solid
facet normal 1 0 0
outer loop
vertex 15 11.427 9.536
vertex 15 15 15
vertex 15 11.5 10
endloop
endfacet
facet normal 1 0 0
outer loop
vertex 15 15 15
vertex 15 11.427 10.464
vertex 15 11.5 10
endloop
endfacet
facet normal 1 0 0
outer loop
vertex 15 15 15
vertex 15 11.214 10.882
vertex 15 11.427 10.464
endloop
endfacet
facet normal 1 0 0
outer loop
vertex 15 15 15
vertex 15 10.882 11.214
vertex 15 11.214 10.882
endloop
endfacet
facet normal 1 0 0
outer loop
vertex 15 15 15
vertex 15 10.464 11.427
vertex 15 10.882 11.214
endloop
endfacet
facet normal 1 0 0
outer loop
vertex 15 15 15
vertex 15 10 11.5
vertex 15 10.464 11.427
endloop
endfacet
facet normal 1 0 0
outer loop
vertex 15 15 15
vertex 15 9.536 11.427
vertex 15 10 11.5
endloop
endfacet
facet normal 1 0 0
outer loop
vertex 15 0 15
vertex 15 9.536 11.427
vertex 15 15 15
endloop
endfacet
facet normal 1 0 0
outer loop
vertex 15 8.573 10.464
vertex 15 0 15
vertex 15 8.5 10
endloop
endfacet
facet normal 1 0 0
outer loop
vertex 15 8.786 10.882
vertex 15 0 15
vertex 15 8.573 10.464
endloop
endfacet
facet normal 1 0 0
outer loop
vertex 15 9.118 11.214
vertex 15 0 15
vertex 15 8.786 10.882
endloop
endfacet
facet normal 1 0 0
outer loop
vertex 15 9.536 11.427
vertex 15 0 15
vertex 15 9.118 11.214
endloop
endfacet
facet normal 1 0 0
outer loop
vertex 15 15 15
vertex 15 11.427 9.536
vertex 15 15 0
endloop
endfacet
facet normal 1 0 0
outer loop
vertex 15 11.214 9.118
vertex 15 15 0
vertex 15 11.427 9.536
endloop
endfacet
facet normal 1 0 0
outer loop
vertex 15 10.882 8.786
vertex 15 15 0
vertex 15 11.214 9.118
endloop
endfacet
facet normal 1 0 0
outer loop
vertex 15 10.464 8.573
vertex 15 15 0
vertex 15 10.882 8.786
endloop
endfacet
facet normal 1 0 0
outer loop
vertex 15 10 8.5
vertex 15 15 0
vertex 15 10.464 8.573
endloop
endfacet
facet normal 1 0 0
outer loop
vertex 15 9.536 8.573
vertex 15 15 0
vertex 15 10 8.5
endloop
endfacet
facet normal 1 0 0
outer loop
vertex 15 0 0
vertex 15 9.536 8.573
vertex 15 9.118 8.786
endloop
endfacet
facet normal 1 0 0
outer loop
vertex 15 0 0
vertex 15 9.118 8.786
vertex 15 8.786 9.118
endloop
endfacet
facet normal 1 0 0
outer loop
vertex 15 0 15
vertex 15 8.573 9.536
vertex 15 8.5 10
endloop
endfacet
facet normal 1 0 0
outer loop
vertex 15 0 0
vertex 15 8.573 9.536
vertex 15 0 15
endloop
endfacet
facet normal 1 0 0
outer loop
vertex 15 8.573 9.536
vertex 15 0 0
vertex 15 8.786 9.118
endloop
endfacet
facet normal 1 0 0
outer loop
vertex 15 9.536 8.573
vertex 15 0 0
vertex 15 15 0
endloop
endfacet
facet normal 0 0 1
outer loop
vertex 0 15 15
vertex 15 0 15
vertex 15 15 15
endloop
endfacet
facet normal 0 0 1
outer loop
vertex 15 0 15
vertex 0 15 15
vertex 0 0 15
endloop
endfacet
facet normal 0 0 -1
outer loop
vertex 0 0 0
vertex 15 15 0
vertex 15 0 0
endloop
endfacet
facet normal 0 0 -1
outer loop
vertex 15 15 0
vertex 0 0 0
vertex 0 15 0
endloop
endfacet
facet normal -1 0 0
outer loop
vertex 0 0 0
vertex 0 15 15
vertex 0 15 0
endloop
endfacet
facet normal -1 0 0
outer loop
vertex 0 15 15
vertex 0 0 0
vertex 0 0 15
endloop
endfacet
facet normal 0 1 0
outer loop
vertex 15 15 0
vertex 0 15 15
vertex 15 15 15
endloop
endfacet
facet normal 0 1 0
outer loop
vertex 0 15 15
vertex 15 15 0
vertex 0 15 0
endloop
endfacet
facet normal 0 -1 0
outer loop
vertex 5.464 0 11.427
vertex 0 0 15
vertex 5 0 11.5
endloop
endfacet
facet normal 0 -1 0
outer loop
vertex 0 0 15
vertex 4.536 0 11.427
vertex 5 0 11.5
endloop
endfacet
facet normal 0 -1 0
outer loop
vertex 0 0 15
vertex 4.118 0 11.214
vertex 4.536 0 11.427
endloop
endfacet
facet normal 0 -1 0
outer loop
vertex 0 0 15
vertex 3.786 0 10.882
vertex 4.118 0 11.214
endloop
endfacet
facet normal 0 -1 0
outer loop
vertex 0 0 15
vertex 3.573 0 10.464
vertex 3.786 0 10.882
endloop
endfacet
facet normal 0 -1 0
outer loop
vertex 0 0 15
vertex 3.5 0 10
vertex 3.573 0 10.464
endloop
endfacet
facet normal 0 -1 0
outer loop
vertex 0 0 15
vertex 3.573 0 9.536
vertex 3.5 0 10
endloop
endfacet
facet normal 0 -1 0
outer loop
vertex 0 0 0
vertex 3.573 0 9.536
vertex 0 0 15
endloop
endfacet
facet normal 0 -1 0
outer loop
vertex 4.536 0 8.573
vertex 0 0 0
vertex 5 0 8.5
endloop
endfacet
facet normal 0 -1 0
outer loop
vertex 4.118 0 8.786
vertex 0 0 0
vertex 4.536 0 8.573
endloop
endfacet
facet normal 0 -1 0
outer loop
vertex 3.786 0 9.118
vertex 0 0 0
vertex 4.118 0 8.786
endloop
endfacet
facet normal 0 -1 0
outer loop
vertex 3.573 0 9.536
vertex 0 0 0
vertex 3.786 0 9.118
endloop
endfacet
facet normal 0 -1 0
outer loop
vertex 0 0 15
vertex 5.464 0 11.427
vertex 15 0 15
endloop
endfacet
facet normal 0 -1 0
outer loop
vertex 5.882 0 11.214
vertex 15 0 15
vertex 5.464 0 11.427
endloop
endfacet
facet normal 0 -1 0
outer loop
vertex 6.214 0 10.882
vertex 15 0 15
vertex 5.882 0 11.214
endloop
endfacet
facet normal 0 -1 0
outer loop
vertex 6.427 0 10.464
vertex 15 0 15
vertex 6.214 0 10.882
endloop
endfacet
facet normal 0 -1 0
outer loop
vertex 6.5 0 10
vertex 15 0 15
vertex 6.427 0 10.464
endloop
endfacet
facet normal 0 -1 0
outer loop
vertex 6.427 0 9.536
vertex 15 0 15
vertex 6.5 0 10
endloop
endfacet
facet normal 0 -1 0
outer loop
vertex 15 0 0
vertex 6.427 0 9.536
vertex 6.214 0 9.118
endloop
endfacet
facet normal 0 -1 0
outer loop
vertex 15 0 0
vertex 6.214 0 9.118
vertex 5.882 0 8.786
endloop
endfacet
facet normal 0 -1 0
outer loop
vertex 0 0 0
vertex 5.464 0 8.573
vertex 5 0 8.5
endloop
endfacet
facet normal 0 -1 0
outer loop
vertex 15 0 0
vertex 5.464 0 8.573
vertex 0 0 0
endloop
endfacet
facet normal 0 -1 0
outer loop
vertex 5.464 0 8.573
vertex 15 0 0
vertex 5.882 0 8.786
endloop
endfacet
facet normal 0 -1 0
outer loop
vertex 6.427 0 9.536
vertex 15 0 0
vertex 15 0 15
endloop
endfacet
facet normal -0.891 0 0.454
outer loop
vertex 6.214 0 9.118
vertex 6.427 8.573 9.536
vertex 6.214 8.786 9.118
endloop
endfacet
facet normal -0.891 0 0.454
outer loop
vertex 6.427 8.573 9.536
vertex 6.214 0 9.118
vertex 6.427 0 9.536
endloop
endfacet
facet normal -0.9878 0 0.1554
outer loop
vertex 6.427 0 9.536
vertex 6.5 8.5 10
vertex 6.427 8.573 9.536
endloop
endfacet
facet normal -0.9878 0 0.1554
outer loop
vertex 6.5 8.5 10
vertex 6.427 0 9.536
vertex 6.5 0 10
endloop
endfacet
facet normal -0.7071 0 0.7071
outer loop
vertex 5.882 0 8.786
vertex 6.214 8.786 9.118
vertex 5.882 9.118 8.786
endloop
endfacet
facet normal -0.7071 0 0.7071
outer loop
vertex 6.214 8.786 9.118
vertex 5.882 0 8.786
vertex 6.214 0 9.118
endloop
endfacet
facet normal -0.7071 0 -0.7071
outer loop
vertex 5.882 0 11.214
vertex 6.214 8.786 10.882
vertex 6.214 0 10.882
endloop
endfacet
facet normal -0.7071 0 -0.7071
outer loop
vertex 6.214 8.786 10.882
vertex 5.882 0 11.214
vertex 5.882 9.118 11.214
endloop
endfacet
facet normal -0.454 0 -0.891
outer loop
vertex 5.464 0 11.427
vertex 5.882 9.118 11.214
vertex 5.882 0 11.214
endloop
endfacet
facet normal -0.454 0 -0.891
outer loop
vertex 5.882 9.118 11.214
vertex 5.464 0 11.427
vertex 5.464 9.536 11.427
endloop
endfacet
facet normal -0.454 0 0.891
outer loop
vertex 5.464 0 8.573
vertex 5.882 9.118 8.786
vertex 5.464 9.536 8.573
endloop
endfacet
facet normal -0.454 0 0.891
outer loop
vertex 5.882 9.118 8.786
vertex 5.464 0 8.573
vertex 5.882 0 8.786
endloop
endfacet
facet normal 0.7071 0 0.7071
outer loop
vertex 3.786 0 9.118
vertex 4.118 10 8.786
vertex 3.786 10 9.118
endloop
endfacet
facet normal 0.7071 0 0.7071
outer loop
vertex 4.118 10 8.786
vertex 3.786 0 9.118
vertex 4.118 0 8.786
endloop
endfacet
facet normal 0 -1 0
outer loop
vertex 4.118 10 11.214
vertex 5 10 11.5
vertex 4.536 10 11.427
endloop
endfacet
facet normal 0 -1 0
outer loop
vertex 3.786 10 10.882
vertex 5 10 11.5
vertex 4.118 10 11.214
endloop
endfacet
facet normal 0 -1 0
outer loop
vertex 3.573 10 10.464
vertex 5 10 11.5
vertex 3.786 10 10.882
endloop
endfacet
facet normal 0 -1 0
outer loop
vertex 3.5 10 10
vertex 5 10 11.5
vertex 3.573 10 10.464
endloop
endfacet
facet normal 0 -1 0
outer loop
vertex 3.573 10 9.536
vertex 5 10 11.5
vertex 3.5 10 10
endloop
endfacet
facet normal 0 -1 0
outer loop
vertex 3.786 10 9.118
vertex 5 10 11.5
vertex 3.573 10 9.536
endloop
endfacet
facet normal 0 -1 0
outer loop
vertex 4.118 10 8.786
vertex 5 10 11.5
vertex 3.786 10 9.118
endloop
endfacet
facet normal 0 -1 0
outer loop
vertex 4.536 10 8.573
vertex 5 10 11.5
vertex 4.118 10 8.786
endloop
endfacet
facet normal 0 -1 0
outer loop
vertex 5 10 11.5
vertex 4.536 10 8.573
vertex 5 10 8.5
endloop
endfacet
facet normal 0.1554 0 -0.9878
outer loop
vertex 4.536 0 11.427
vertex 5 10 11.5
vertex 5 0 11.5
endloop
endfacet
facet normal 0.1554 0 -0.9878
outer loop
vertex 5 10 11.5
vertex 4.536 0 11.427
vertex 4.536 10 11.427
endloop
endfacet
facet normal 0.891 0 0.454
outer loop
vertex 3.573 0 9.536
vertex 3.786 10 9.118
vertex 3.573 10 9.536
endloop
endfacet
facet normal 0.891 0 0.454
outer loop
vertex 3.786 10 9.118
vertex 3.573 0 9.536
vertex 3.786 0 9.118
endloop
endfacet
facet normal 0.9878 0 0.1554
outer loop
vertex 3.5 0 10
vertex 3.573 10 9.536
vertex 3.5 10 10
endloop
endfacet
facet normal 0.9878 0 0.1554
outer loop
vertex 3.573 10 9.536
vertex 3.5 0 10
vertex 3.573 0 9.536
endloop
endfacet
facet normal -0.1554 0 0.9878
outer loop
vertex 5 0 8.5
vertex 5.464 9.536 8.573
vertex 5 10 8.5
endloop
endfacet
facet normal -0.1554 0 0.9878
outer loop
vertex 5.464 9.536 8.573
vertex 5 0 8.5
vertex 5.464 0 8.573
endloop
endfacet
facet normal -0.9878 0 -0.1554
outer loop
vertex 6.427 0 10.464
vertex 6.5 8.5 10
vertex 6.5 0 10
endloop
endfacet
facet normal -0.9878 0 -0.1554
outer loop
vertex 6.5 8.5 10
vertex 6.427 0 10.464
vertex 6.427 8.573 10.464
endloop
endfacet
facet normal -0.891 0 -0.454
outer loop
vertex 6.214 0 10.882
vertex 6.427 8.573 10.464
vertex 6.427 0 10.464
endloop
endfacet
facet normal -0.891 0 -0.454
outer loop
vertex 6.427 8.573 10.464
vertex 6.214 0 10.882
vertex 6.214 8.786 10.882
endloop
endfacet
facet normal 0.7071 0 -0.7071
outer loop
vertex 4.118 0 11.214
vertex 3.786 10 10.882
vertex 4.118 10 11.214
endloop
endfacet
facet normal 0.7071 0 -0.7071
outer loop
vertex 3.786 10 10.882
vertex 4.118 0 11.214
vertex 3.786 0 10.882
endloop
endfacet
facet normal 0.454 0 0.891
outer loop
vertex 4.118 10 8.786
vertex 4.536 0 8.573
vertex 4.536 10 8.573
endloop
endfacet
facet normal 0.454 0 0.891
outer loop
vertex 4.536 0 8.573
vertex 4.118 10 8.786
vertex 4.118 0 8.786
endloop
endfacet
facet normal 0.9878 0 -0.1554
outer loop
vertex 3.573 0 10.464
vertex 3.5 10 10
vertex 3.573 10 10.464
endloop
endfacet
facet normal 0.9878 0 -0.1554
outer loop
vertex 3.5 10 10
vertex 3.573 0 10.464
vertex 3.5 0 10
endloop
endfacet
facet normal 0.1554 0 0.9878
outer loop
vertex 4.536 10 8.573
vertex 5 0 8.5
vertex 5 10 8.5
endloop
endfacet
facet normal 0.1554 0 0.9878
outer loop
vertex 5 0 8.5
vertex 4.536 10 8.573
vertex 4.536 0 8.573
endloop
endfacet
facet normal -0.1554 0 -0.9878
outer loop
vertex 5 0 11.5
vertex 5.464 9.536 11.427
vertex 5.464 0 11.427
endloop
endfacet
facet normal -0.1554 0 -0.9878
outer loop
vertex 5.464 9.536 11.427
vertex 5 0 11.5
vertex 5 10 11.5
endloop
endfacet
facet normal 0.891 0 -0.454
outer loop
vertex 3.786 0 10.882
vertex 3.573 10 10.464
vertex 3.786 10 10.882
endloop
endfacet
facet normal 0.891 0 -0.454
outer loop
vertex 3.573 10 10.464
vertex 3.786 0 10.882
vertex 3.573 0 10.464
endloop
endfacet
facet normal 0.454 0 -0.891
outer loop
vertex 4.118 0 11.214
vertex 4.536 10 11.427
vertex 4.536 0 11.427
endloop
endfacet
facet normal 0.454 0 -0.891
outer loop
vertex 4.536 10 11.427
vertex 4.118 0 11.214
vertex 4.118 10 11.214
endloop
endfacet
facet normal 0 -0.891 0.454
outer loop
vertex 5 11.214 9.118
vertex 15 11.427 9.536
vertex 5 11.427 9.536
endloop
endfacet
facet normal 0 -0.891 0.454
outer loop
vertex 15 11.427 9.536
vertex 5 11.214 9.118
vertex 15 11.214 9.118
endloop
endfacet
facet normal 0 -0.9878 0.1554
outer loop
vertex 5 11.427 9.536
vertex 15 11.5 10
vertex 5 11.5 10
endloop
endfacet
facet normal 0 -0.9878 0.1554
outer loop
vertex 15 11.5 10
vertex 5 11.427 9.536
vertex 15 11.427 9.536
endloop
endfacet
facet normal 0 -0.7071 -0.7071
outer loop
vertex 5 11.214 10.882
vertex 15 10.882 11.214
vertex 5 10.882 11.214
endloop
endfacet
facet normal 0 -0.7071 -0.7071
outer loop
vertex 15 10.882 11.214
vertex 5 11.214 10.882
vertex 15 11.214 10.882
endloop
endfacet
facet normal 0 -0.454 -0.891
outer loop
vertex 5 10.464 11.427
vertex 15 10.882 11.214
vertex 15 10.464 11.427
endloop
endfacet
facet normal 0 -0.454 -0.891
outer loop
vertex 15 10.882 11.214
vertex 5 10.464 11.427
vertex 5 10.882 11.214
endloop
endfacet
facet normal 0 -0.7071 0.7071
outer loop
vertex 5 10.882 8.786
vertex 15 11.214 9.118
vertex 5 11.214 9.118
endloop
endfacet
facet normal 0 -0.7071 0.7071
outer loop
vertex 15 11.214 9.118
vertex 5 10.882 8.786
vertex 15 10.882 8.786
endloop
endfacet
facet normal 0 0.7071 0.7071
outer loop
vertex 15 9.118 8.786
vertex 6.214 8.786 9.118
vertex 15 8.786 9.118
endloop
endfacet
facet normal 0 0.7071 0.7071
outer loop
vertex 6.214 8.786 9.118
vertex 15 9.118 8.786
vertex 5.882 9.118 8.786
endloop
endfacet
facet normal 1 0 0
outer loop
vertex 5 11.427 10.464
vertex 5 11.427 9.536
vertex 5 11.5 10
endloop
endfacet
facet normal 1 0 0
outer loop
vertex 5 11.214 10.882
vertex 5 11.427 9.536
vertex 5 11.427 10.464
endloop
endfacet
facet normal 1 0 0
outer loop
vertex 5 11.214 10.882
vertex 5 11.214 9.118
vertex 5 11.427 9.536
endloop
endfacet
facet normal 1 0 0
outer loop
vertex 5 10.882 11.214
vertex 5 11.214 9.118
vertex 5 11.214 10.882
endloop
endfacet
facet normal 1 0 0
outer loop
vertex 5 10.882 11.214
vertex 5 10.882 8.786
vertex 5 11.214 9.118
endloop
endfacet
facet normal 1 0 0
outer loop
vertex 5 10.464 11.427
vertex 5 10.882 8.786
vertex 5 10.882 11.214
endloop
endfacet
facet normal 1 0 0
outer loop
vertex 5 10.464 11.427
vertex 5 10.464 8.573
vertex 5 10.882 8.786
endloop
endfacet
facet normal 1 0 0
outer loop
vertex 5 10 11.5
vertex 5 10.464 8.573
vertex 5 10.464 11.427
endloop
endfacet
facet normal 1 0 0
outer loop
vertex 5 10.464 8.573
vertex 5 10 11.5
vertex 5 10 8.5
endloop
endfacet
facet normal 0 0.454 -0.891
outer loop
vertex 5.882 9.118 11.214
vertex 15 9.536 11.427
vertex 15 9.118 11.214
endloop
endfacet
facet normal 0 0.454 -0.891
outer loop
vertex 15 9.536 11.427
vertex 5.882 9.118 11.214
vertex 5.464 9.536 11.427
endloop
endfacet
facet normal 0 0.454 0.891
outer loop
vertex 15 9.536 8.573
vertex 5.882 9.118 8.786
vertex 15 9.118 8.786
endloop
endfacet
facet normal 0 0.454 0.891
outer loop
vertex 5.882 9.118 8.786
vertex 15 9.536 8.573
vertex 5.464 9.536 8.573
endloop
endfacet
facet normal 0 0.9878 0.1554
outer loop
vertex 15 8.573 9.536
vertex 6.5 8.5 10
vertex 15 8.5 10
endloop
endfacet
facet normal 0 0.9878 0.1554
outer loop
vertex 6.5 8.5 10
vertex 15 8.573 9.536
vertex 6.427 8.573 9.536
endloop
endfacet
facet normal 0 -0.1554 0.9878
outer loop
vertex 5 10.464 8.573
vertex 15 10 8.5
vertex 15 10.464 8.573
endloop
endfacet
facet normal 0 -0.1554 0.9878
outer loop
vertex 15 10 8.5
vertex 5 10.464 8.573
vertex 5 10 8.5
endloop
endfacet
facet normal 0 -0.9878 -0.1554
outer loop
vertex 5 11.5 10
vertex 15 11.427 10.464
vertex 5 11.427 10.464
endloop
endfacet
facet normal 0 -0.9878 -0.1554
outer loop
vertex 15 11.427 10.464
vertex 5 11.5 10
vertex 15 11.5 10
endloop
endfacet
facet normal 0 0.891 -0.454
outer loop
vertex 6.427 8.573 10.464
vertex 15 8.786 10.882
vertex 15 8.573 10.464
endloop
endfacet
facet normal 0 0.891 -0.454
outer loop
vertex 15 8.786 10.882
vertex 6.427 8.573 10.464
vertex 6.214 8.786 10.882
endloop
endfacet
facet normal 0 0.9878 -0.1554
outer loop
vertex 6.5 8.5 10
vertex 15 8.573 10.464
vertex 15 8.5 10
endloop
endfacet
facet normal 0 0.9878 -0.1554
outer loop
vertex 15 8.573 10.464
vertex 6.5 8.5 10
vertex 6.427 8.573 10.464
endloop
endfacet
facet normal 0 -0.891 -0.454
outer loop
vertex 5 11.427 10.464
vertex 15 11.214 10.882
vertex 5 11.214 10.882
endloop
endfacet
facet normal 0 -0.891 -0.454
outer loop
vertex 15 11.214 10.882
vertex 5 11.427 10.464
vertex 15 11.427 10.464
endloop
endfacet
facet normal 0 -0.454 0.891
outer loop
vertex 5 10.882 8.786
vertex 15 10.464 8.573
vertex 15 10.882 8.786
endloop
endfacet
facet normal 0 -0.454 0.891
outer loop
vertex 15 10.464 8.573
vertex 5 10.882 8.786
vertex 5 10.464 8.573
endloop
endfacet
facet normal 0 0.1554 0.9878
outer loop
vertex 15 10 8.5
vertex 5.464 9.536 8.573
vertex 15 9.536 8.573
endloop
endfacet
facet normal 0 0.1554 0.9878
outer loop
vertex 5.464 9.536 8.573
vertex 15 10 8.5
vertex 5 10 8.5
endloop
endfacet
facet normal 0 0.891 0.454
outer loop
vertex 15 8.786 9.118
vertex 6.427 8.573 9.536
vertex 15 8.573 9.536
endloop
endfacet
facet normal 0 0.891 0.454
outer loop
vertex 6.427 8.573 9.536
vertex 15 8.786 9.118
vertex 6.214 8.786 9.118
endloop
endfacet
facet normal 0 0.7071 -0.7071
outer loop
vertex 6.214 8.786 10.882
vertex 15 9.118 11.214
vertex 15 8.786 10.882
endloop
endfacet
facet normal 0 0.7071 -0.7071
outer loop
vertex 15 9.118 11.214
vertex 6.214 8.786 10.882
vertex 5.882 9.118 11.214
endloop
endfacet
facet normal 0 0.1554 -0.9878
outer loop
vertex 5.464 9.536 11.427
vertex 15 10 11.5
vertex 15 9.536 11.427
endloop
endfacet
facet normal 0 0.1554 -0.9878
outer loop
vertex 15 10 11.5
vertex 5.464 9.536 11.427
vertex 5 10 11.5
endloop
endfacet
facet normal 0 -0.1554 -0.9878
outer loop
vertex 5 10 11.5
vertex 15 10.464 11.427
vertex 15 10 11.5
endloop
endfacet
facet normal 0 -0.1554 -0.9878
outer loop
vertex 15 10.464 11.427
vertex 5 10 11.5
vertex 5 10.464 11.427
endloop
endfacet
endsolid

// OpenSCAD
$fn = 20;

difference(){
    
    cube(15,15,15);
    
    translate([5,0,10]) rotate([270,0,0]) cylinder(10,1.5,1.5);
    
    translate([15,10,10]) rotate([270,0,90]) cylinder(10,1.5,1.5);
}
